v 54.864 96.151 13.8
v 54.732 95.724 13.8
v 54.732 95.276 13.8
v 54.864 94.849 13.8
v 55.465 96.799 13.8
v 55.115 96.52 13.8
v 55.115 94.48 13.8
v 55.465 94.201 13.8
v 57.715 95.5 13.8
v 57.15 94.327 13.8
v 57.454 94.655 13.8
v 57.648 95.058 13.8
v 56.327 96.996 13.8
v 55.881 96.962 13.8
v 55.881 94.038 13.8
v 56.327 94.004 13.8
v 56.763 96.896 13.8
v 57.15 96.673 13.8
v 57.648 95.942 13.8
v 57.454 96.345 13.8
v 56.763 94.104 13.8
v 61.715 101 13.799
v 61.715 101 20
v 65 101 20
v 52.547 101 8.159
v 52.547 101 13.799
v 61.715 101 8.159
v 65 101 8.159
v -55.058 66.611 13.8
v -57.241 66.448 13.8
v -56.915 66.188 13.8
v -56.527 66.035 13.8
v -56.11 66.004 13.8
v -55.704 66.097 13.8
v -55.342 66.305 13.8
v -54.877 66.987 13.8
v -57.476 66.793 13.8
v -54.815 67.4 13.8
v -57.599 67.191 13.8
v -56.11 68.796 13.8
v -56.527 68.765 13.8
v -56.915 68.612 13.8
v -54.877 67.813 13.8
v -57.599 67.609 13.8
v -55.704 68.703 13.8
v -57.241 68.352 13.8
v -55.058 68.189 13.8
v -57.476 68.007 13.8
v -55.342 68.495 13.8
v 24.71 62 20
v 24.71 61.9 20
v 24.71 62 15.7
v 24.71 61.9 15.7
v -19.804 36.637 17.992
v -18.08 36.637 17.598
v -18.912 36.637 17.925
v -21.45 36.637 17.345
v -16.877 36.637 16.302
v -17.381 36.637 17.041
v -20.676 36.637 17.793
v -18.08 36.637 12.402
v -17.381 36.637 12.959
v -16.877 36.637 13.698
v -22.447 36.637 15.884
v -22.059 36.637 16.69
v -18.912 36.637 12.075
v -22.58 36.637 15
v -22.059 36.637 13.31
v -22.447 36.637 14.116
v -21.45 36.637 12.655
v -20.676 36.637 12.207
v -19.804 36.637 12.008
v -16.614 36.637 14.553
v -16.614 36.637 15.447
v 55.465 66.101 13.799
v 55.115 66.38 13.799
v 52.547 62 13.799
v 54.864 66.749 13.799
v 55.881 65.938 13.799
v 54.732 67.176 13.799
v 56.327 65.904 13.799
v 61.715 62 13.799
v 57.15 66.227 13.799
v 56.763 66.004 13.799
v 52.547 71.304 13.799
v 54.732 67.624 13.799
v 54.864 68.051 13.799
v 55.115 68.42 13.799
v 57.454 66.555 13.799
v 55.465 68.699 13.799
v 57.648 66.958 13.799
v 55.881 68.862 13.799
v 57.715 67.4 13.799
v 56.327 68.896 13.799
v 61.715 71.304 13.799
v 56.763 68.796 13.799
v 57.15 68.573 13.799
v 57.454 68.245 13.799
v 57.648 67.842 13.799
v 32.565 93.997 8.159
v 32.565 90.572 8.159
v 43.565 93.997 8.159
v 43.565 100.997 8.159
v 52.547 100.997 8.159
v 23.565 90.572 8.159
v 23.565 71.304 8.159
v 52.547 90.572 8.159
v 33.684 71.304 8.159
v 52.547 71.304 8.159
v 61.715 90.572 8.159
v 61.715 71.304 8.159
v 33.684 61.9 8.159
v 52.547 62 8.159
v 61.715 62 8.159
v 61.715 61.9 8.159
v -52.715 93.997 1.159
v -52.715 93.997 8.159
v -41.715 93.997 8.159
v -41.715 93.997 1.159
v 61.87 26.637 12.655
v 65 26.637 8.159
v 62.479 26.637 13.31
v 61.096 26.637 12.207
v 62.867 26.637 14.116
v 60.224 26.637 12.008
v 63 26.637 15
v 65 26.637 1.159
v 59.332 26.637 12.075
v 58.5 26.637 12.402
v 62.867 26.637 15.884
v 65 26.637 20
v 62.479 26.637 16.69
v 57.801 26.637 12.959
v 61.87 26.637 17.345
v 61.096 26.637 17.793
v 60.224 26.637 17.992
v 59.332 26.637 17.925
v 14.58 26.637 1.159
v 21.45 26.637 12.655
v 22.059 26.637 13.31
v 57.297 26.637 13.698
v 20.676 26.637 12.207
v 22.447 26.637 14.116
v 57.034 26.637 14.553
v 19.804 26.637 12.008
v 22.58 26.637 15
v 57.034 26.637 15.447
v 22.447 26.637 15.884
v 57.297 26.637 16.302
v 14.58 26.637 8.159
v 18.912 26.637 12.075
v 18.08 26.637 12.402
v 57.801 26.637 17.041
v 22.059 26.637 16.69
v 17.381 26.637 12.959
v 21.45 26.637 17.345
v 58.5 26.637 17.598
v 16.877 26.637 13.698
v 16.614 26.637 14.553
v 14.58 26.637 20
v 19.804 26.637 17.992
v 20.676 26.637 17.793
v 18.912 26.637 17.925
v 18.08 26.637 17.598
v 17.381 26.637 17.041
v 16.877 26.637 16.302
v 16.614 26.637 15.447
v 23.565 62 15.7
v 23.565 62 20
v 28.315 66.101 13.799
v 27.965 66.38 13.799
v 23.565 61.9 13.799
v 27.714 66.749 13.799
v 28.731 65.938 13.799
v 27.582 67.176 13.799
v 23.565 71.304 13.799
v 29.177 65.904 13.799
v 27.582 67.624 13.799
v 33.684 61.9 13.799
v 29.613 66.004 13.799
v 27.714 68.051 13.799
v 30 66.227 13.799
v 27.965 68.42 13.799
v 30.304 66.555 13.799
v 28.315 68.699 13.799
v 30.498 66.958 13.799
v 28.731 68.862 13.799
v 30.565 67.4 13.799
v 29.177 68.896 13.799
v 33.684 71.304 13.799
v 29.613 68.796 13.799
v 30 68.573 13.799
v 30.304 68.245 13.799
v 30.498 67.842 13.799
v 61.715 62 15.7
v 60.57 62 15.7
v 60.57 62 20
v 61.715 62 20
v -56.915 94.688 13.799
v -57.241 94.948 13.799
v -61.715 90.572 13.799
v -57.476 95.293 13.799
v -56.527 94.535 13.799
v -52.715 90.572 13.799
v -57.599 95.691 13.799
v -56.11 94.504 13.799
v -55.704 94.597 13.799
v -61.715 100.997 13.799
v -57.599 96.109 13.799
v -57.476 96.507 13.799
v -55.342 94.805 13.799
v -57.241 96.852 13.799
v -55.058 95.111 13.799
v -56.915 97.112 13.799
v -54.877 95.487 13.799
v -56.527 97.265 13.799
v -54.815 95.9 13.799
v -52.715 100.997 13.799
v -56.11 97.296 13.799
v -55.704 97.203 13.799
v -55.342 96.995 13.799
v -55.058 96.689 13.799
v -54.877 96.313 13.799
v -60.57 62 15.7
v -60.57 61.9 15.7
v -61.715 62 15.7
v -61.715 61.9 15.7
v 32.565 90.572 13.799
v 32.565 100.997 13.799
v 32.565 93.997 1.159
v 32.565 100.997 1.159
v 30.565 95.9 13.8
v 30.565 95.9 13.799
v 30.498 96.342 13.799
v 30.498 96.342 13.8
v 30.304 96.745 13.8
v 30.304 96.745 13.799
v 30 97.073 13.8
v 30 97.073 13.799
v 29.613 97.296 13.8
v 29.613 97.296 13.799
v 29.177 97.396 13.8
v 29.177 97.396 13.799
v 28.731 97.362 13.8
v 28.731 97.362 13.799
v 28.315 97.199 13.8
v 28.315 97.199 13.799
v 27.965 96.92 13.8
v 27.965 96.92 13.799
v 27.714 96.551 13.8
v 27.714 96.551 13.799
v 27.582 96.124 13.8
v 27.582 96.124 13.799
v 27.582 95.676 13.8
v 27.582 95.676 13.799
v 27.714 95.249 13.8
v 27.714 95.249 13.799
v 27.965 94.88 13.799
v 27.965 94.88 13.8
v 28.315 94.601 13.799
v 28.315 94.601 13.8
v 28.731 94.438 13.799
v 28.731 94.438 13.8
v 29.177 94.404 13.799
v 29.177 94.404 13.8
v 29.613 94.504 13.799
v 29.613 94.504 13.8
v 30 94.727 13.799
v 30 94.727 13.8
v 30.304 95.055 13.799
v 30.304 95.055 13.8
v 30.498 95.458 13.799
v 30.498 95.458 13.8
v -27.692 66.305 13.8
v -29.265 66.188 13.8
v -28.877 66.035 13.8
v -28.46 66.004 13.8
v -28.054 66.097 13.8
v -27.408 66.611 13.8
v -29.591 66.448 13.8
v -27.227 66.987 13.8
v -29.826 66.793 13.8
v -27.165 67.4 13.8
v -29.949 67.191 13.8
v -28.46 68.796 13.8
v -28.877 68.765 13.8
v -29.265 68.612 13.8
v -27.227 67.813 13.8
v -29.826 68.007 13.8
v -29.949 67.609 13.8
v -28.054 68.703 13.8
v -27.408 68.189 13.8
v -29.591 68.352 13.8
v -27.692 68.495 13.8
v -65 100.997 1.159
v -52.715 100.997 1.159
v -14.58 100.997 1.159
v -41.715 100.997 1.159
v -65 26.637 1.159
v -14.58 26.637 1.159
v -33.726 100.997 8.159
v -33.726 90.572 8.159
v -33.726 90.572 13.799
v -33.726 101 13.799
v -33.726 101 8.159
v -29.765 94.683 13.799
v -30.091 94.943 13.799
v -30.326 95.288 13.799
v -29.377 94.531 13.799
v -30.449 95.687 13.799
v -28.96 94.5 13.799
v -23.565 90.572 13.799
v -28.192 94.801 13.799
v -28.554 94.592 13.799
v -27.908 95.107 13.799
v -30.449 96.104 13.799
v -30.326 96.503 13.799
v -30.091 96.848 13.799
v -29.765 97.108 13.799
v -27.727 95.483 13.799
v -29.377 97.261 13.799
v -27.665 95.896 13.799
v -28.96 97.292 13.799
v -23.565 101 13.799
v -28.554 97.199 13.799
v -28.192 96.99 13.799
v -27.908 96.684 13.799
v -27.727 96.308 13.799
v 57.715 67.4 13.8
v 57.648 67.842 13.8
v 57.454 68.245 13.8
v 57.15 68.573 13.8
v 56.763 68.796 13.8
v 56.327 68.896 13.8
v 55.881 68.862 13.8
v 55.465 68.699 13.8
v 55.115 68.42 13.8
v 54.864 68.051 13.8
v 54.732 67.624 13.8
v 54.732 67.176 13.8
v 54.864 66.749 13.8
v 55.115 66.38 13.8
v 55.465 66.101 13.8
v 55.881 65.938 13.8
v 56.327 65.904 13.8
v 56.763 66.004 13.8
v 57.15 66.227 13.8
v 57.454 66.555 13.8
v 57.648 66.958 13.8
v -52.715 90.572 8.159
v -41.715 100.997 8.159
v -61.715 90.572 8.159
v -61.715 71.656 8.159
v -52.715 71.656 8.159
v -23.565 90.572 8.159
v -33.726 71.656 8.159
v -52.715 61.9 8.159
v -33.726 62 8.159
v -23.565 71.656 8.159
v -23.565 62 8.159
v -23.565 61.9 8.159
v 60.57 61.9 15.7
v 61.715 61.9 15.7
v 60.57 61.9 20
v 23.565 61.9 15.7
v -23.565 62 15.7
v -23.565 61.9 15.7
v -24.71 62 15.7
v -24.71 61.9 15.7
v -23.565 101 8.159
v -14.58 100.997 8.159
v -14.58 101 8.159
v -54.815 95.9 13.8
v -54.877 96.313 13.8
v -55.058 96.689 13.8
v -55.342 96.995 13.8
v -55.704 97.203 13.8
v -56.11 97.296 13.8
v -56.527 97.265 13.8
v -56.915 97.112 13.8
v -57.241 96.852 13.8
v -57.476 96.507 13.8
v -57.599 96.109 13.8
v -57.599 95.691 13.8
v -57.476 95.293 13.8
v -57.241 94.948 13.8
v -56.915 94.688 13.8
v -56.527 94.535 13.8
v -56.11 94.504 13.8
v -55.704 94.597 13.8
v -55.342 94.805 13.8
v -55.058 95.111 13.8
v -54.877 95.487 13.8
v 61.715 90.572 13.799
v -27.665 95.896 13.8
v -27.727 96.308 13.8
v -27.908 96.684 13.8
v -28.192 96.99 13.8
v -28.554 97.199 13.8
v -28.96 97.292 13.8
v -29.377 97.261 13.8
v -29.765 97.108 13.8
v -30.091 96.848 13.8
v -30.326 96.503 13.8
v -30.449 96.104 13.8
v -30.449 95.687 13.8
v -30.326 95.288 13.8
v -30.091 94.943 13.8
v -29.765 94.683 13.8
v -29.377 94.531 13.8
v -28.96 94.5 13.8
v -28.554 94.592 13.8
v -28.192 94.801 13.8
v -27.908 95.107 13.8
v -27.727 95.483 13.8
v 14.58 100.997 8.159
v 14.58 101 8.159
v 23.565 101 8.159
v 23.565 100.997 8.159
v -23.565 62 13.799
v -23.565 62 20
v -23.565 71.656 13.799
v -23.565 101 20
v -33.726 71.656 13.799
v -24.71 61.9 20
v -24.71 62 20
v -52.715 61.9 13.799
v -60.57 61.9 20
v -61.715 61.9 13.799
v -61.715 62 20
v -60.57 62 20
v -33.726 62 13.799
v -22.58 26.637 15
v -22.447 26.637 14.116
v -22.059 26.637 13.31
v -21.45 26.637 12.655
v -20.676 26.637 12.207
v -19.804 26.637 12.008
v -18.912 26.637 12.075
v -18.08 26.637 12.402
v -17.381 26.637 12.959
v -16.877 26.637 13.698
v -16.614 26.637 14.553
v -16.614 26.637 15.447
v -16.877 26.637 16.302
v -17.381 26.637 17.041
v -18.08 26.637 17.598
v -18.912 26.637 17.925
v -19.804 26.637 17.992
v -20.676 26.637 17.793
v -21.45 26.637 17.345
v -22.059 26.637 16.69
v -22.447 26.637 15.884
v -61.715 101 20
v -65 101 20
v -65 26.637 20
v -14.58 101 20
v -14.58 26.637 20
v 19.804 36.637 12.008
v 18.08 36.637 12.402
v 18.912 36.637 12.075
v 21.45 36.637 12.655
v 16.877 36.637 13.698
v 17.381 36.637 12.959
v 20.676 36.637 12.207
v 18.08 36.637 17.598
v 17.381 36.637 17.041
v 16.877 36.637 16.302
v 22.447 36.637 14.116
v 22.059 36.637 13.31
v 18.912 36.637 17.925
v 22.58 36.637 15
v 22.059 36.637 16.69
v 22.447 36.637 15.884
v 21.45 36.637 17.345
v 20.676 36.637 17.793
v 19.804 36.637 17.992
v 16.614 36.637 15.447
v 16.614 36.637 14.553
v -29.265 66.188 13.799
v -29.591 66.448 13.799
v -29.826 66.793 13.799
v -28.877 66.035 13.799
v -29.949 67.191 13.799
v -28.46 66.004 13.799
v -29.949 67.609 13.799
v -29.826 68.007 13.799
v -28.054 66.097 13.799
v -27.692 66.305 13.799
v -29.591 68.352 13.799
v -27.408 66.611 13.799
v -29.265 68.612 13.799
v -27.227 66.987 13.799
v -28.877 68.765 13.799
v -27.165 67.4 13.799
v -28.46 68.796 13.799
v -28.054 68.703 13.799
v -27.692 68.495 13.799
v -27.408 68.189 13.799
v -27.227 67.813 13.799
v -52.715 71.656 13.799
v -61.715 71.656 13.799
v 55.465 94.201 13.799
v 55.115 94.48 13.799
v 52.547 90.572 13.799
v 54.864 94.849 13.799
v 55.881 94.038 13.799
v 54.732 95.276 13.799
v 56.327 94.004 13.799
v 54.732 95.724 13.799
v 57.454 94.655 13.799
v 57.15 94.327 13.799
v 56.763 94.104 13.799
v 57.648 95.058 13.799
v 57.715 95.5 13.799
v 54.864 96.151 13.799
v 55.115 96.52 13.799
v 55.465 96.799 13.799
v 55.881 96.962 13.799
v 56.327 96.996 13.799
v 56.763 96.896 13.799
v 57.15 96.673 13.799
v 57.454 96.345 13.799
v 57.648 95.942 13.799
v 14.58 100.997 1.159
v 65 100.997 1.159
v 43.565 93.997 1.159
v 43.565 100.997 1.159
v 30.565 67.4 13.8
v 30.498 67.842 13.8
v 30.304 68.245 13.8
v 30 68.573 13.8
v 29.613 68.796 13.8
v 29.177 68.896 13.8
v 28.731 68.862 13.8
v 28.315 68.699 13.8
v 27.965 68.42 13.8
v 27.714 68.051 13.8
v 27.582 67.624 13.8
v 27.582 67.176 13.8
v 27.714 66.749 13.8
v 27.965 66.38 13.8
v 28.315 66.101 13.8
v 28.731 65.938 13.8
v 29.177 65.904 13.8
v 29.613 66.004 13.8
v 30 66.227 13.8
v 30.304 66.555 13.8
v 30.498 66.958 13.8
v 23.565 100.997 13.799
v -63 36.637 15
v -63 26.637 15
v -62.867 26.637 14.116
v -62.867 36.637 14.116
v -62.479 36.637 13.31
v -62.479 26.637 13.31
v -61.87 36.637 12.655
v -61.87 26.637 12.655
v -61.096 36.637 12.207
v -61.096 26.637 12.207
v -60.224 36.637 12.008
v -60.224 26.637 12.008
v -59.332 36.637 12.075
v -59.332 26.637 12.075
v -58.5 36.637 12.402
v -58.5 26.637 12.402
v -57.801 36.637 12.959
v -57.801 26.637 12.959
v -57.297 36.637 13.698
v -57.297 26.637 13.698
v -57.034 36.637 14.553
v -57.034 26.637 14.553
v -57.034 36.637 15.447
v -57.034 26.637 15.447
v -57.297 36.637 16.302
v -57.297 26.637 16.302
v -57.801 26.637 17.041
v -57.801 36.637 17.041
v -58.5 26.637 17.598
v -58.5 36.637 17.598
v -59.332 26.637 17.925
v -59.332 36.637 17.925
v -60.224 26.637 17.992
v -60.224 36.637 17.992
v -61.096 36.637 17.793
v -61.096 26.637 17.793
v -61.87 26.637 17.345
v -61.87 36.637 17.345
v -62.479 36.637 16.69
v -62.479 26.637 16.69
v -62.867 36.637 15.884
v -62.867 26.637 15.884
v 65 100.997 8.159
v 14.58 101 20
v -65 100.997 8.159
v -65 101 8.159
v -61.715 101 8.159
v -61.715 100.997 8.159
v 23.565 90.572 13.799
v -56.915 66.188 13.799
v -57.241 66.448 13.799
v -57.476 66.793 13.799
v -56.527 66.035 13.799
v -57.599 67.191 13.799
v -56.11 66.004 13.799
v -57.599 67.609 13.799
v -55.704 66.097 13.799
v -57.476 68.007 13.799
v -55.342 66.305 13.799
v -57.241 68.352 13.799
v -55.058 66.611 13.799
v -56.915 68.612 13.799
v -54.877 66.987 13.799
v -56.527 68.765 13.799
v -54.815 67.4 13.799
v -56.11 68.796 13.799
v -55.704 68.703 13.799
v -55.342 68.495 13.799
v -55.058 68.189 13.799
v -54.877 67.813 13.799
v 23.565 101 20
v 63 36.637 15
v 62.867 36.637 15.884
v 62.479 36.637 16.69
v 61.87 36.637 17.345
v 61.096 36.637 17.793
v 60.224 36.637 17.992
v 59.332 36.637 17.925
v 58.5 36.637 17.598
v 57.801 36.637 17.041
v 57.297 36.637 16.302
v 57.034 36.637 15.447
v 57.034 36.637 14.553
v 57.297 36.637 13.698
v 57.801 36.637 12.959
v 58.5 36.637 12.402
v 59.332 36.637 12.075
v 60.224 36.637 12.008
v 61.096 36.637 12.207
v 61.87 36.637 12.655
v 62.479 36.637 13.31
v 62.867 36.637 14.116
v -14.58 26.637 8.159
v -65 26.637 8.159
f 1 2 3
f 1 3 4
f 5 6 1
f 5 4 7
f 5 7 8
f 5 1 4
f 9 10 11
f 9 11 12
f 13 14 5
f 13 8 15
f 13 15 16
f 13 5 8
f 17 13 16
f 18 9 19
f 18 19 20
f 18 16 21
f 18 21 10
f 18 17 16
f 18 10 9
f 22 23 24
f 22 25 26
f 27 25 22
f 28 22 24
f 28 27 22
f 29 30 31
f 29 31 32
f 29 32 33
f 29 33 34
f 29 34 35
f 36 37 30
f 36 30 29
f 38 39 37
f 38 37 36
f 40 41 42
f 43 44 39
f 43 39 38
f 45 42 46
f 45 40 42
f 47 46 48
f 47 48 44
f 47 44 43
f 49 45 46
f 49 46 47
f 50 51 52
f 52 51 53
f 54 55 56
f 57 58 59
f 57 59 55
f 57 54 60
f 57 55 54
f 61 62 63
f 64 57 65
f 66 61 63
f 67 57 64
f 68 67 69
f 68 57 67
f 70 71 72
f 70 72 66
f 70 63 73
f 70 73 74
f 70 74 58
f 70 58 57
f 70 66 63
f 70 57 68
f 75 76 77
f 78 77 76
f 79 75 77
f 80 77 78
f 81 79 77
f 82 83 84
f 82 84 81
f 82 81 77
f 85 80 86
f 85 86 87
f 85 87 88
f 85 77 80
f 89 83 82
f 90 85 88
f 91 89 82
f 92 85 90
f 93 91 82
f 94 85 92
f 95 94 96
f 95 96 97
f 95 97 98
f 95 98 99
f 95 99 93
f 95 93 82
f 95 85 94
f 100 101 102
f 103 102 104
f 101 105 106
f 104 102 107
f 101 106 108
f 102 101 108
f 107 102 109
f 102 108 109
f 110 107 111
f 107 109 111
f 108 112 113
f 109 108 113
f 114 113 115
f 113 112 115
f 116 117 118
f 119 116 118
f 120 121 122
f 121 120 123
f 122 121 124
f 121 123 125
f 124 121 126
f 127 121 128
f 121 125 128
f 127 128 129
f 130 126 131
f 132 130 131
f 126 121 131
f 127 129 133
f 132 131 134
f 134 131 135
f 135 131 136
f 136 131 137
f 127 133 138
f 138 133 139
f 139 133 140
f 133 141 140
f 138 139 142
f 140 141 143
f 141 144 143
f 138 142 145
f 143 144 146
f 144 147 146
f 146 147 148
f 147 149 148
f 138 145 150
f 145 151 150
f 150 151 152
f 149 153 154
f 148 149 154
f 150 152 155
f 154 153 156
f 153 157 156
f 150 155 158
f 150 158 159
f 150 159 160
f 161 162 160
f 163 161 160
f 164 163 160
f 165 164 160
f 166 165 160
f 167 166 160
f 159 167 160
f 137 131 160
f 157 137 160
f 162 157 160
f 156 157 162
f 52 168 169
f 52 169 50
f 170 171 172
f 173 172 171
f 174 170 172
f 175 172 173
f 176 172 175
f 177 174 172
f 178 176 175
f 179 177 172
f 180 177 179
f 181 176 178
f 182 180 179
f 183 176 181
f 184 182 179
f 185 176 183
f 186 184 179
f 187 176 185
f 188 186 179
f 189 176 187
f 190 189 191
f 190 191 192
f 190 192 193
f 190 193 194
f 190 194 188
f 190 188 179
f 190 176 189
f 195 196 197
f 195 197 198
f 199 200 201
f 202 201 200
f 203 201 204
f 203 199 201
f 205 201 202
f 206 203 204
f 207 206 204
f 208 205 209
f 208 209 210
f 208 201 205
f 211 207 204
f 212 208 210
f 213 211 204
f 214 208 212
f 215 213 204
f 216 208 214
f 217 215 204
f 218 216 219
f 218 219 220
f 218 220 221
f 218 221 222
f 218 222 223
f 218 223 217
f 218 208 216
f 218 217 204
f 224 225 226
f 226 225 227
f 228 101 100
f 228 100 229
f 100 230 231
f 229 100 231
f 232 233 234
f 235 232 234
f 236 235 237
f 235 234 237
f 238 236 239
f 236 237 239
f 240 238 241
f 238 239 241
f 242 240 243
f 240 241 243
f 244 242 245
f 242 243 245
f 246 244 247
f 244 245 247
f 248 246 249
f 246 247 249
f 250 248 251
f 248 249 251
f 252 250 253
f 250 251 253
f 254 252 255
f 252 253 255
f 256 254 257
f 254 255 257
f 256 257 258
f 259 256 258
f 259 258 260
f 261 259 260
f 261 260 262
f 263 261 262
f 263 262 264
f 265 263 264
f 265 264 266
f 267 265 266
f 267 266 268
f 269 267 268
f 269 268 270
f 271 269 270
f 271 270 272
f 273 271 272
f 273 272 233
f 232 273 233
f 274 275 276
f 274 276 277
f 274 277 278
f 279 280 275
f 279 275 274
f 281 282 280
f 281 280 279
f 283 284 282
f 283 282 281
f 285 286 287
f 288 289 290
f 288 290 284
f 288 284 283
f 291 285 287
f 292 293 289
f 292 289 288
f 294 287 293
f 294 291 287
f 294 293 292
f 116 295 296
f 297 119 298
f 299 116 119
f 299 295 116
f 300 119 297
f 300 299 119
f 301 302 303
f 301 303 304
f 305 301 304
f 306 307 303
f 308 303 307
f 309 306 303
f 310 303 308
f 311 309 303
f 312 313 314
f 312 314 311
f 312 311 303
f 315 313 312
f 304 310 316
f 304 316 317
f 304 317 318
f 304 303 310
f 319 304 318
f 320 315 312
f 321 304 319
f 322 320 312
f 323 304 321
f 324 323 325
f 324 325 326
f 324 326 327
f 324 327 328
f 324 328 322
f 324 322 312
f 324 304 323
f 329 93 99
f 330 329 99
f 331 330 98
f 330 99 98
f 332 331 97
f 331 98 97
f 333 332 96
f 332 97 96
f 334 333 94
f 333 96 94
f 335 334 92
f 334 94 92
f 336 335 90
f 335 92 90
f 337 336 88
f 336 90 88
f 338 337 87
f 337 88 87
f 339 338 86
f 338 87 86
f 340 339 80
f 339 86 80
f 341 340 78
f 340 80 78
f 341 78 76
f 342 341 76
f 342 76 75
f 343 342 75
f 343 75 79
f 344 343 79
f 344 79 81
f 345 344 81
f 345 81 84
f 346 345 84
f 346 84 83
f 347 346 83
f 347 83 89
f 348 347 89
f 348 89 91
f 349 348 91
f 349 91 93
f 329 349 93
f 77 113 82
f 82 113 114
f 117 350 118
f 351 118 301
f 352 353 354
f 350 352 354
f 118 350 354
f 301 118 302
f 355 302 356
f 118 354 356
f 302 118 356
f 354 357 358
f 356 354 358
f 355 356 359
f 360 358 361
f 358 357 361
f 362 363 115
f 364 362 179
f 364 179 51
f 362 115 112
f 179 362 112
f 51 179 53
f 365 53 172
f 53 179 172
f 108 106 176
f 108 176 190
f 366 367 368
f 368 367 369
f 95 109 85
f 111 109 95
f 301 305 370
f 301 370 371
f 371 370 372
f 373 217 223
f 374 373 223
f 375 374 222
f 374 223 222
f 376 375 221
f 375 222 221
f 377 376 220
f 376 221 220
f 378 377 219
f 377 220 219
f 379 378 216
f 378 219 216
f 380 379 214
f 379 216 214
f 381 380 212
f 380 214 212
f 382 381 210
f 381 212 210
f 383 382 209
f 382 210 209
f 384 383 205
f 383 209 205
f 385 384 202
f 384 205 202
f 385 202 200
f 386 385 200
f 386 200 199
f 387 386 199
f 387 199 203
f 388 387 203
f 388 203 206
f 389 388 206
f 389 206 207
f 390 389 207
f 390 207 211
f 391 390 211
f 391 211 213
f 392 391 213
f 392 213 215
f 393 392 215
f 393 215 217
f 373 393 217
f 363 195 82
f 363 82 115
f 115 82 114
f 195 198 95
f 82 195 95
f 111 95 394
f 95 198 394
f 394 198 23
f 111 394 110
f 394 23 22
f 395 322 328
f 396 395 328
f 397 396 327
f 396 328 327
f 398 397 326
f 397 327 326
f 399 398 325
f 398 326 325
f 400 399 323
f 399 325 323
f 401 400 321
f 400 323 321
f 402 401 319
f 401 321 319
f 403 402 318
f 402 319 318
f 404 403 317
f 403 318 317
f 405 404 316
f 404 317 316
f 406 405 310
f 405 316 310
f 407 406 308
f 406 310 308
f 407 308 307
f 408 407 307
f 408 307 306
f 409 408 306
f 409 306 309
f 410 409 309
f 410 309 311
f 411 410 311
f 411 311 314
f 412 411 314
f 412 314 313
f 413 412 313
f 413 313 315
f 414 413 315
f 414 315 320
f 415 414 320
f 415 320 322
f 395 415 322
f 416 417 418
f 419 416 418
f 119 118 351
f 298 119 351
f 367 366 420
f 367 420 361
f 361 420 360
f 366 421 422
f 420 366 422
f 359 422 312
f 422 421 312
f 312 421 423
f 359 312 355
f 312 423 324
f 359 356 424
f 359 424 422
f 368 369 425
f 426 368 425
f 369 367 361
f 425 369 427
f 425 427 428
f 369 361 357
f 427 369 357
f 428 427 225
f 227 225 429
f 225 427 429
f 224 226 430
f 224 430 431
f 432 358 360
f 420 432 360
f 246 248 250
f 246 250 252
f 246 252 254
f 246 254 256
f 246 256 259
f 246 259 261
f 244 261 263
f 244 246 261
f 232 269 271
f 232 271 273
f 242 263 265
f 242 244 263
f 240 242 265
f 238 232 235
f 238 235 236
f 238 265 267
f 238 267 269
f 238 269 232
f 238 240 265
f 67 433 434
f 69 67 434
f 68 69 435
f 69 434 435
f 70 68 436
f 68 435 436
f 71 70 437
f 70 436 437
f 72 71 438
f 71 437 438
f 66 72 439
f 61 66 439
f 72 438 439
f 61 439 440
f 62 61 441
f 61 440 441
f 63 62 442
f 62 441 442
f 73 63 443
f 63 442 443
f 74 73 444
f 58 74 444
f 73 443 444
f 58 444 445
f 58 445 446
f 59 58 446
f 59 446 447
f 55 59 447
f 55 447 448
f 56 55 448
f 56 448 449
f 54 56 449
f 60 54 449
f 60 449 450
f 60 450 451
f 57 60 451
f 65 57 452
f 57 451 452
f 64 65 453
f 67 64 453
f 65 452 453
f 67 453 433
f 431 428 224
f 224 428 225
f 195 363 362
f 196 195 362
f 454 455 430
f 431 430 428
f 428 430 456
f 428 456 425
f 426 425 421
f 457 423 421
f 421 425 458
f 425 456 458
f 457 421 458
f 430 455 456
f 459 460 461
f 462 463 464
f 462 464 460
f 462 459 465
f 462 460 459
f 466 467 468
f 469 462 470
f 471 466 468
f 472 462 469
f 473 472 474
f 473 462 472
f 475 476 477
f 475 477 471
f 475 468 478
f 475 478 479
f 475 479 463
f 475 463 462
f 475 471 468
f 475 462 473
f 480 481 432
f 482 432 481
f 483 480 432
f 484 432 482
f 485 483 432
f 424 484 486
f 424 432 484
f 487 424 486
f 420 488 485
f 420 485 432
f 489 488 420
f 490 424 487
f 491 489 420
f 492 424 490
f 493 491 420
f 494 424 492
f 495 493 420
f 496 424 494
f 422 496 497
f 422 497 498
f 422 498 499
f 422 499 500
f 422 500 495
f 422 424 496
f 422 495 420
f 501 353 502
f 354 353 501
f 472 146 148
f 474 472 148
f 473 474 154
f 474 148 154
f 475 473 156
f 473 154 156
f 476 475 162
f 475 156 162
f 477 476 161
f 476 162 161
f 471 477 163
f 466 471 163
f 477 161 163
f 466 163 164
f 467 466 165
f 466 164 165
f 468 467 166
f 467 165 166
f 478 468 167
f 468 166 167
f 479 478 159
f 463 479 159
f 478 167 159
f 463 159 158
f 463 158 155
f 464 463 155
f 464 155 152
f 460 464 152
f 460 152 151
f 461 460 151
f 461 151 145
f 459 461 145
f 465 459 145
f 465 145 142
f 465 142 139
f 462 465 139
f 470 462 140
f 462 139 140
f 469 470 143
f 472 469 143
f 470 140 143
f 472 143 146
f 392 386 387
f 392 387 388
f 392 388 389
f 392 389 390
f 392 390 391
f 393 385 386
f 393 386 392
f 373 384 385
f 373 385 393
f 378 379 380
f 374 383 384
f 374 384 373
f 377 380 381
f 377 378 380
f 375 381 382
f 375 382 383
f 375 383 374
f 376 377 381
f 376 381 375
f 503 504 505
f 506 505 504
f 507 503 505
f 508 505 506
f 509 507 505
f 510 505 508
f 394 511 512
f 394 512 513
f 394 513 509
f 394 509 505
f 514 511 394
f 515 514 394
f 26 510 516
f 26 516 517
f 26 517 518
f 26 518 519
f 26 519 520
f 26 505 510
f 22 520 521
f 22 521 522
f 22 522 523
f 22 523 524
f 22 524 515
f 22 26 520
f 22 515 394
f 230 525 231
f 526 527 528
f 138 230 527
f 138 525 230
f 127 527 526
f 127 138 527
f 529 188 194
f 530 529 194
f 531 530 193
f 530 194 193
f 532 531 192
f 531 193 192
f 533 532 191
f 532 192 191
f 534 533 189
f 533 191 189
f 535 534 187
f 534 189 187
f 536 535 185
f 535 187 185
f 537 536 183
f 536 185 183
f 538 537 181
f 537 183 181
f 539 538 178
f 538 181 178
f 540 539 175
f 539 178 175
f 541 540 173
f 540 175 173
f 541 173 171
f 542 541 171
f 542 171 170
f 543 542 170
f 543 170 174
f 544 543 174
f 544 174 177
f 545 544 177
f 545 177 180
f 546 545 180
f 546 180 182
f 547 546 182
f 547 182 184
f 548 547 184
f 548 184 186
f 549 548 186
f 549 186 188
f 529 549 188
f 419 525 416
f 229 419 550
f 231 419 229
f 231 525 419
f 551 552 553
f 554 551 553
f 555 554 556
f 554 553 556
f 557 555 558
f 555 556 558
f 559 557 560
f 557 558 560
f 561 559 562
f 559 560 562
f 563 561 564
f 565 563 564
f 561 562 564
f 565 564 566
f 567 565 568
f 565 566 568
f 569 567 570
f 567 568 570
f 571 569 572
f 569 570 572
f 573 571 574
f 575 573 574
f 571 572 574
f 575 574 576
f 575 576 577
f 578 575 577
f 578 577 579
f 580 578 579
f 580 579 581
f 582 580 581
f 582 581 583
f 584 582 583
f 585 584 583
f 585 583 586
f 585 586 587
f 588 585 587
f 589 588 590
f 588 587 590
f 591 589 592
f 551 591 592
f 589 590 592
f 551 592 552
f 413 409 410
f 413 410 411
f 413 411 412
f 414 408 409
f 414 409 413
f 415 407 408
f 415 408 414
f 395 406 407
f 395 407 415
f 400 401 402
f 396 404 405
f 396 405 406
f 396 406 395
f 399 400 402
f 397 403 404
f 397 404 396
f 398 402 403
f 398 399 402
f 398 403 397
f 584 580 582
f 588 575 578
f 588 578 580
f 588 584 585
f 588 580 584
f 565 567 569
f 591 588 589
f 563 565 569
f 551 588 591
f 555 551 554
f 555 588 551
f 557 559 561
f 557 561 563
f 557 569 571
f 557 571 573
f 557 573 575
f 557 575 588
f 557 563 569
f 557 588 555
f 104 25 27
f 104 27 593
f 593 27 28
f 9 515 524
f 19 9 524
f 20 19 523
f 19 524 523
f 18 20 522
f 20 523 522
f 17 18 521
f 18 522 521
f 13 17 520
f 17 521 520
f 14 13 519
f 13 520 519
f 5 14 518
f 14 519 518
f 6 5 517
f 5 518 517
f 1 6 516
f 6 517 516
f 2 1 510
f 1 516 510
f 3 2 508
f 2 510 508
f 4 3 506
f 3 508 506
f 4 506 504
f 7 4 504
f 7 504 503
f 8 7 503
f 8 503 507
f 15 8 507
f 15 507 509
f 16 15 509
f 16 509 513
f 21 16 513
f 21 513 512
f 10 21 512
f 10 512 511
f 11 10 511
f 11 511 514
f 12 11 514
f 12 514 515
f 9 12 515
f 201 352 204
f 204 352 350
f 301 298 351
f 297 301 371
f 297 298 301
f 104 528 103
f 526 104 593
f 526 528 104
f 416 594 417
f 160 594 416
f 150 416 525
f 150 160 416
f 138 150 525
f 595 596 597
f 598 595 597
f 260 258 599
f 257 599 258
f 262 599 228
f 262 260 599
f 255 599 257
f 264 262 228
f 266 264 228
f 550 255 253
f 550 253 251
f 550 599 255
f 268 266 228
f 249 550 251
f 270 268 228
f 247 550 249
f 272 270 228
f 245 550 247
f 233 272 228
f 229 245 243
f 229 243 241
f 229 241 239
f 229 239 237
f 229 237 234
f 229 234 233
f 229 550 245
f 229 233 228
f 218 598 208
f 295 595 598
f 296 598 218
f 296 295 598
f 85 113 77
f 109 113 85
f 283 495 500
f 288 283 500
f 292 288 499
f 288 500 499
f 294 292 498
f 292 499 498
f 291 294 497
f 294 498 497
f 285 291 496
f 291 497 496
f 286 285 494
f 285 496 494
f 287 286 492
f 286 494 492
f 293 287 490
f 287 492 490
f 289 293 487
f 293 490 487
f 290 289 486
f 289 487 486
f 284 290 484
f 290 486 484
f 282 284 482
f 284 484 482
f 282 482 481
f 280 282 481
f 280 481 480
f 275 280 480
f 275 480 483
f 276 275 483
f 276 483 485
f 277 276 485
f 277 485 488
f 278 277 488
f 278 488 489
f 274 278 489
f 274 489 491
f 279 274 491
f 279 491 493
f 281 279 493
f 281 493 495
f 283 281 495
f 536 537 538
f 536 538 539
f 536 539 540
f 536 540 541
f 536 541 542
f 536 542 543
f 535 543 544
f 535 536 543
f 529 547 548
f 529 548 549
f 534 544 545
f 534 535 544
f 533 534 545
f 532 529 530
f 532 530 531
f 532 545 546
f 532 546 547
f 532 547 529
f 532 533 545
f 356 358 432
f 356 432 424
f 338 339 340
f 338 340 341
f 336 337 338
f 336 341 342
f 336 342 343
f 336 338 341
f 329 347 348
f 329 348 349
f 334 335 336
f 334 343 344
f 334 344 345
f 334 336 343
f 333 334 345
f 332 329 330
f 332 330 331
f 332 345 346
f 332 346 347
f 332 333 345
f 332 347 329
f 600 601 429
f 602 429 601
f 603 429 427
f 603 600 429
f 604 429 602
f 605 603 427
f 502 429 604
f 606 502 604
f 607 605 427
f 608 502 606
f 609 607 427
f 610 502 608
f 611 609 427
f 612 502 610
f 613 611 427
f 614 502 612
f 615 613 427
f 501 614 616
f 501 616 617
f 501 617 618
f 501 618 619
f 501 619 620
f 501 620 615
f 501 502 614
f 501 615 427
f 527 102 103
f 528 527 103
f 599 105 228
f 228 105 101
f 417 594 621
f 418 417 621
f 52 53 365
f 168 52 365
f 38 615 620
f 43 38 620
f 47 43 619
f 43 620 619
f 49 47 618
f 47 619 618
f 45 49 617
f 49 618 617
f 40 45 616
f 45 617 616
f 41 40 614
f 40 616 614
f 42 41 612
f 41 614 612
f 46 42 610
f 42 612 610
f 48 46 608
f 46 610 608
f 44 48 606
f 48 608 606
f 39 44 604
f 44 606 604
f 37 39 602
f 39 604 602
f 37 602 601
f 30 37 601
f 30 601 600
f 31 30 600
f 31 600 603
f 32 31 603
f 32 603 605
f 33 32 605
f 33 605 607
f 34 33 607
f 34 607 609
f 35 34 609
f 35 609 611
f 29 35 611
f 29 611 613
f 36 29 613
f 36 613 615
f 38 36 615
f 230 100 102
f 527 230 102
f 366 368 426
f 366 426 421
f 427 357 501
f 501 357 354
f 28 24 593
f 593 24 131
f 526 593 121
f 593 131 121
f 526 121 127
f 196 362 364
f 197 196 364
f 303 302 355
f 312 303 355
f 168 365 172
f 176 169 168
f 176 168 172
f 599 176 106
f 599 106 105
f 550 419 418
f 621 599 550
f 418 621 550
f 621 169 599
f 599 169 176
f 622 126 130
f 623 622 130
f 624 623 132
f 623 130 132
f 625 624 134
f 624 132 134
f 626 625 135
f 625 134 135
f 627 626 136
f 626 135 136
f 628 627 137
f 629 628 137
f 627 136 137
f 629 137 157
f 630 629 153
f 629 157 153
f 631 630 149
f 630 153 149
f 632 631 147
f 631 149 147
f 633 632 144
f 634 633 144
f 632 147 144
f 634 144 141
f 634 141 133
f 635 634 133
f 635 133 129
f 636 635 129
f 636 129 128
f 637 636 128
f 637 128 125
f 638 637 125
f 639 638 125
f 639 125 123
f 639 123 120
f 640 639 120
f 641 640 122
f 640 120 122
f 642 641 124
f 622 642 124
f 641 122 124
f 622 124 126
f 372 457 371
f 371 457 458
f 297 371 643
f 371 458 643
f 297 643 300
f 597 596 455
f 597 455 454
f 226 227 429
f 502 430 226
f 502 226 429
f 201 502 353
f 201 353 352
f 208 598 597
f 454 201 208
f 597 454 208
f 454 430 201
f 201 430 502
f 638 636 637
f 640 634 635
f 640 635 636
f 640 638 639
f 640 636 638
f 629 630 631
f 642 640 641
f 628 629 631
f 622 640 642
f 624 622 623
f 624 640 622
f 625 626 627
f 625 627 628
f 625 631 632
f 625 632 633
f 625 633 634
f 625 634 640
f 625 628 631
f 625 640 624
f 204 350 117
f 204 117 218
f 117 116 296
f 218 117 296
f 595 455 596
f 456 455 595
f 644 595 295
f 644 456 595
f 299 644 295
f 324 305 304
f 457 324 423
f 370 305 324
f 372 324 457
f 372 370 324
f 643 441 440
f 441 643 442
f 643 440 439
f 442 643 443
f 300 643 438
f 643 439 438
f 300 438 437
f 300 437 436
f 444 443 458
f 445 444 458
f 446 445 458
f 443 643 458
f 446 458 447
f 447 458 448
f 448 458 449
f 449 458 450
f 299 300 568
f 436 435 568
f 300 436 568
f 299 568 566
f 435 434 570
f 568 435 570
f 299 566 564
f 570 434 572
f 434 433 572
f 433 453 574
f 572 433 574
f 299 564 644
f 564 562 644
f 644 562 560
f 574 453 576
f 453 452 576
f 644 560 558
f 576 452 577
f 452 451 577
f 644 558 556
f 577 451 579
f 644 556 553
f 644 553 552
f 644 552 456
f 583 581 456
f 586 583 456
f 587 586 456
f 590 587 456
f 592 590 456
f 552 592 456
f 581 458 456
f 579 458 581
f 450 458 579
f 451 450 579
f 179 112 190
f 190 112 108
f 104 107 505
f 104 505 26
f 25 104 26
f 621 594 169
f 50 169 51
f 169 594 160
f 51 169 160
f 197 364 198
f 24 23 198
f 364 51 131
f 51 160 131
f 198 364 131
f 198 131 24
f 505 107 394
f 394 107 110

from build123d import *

# Parameters (mm, degrees)
SKETCH2_W            = 130
SKETCH2_H            = 40
BOSS_EXTRUDE1_DEPTH  = 75
SKETCH6_W            = 29.16
SKETCH6_H            = 49.32
BOSS_EXTRUDE2_DEPTH  = 16.07
SKETCH7_W            = 15.96
SKETCH7_H            = 42.65
CUT_EXTRUDE1_DEPTH   = 8.48
SKETCH8_W            = 7
SKETCH8_H            = 42.65
CUT_EXTRUDE2_DEPTH   = 1.145
SKETCH9_W            = 7
SKETCH9_H            = 42.65
CUT_EXTRUDE3_DEPTH   = 1.145
SKETCH11_W           = 35.86
SKETCH11_H           = 21.1
CUT_EXTRUDE4_DEPTH   = 8.2
SKETCH13_W           = 3.9
SKETCH13_H           = 21.1
CUT_EXTRUDE5_DEPTH   = 1.145
SKETCH14_W           = 3.9
SKETCH14_H           = 21.1
CUT_EXTRUDE6_DEPTH   = 1.145
SKETCH15_W           = 35.86
SKETCH15_H           = 21.1
CUT_EXTRUDE7_DEPTH   = 8.2
SKETCH16_W           = 3.9
SKETCH16_H           = 21.1
CUT_EXTRUDE8_DEPTH   = 1.145
SKETCH17_W           = 3.9
SKETCH17_H           = 21.1
CUT_EXTRUDE9_DEPTH   = 1.145
SKETCH20_W           = 29.16
SKETCH20_H           = 16.07
BOSS_EXTRUDE3_DEPTH  = 25.68
SKETCH21_W           = 40
SKETCH21_H           = 25
CUT_EXTRUDE10_DEPTH  = 40
SKETCH22_W           = 50
SKETCH22_H           = 25
CUT_EXTRUDE11_DEPTH  = 40
BOSS_EXTRUDE4_DEPTH  = 8
BOSS_EXTRUDE5_DEPTH  = 8
SKETCH25_W           = 130
SKETCH25_H           = 26.637321837
CUT_EXTRUDE12_DEPTH  = 57.07
SKETCH26_W           = 130
SKETCH26_H           = 25
BOSS_EXTRUDE6_DEPTH  = 40
SKETCH27_W           = 29.16
SKETCH27_H           = 48.362678163
CUT_EXTRUDE13_DEPTH  = 57.07
BOSS_EXTRUDE9_DEPTH  = 26
BOSS_EXTRUDE10_DEPTH = 26
SKETCH32_W           = 38.15
SKETCH32_H           = 39.1
SKETCH32_R           = 2.5
CUT_EXTRUDE14_DEPTH  = 24
SKETCH33_R           = 1.4
BOSS_EXTRUDE11_DEPTH = 2
SKETCH34_W           = 1.145
SKETCH34_H           = 4.3
CUT_EXTRUDE15_DEPTH  = 39
SKETCH35_W           = 38.15
SKETCH35_H           = 39.1
SKETCH35_R           = 2.5
CUT_EXTRUDE16_DEPTH  = 24
SKETCH36_W           = 1.145
SKETCH36_H           = 4.3
CUT_EXTRUDE17_DEPTH  = 39
SKETCH37_R           = 1.5
BOSS_EXTRUDE12_DEPTH = 2
SKETCH41_W           = 11
SKETCH41_H           = 5.5
CUT_EXTRUDE18_DEPTH  = 8.8
SKETCH42_W           = 11
SKETCH42_H           = 5.5
CUT_EXTRUDE19_DEPTH  = 8.8
SKETCH43_R           = 3
CUT_EXTRUDE20_DEPTH  = 10
SKETCH44_R           = 3
CUT_EXTRUDE21_DEPTH  = 10
SKETCH45_W           = 50.42
SKETCH45_H           = 28.159053891
CUT_EXTRUDE22_DEPTH  = 90
SKETCH46_W           = 50.42
SKETCH46_H           = 28.159053891
CUT_EXTRUDE23_DEPTH  = 90
SKETCH47_W           = 50.42
SKETCH47_H           = 7
BOSS_EXTRUDE13_DEPTH = 7
SKETCH48_W           = 50.42
SKETCH48_H           = 7
BOSS_EXTRUDE14_DEPTH = 67.36
SKETCH49_W           = 11
SKETCH49_H           = 7
CUT_EXTRUDE24_DEPTH  = 8
SKETCH50_W           = 9
SKETCH50_H           = 10.425354422
SKETCH50_H_2         = 9.756007641
SKETCH50_W_2         = 10.161312311
SKETCH50_H_3         = 9.656007641
SKETCH50_H_4         = 10.428032585
BOSS_EXTRUDE15_DEPTH = 5.64
SKETCH51_W           = 9
SKETCH51_H           = 10.425354422
SKETCH51_W_2         = 9.167731693
SKETCH51_H_2         = 10.428032585
SKETCH51_W_3         = 10.119146351
SKETCH51_H_3         = 9.404026774
SKETCH51_H_4         = 9.304026774
BOSS_EXTRUDE16_DEPTH = 5.64


with BuildPart() as part:
    # Sketch2 → Boss-Extrude1 (new body)
    with BuildSketch(Plane(origin=(0, 0, 0), x_dir=(1, 0, 0), z_dir=(0, 1, 0))):
        Rectangle(SKETCH2_W, SKETCH2_H)
    extrude(amount=BOSS_EXTRUDE1_DEPTH)

    # Sketch6 → Boss-Extrude2 (add)
    with BuildSketch(Plane.XY.offset(20)):
        with Locations((0, 50.34)):
            Rectangle(SKETCH6_W, SKETCH6_H)
    extrude(amount=BOSS_EXTRUDE2_DEPTH)

    # Sketch7 → Cut-Extrude1 (cut)
    with BuildSketch(Plane.XY.offset(36.07)):
        with Locations((0, 53.675)):
            Rectangle(SKETCH7_W, SKETCH7_H)
    extrude(amount=-CUT_EXTRUDE1_DEPTH, mode=Mode.SUBTRACT)

    # Sketch8 → Cut-Extrude2 (cut)
    with BuildSketch(Plane(origin=(-7.98, 0, 0), x_dir=(0, 0, -1), z_dir=(1, 0, 0))):
        with Locations((-31.09, 53.675)):
            Rectangle(SKETCH8_W, SKETCH8_H)
    extrude(amount=-CUT_EXTRUDE2_DEPTH, mode=Mode.SUBTRACT)

    # Sketch9 → Cut-Extrude3 (cut)
    with BuildSketch(Plane.ZY.offset(-7.98)):
        with Locations((31.09, 53.675)):
            Rectangle(SKETCH9_W, SKETCH9_H)
    extrude(amount=-CUT_EXTRUDE3_DEPTH, mode=Mode.SUBTRACT)

    # Sketch11 → Cut-Extrude4 (cut)
    with BuildSketch(Plane.XY.offset(20)):
        with Locations((42.64, 64.45)):
            Rectangle(SKETCH11_W, SKETCH11_H)
    extrude(amount=-CUT_EXTRUDE4_DEPTH, mode=Mode.SUBTRACT)

    # Sketch13 → Cut-Extrude5 (cut)
    with BuildSketch(Plane(origin=(24.71, 0, 0), x_dir=(0, 0, -1), z_dir=(1, 0, 0))):
        with Locations((-13.75, 64.45)):
            Rectangle(SKETCH13_W, SKETCH13_H)
    extrude(amount=-CUT_EXTRUDE5_DEPTH, mode=Mode.SUBTRACT)

    # Sketch14 → Cut-Extrude6 (cut)
    with BuildSketch(Plane.ZY.offset(-60.57)):
        with Locations((13.75, 64.45)):
            Rectangle(SKETCH14_W, SKETCH14_H)
    extrude(amount=-CUT_EXTRUDE6_DEPTH, mode=Mode.SUBTRACT)

    # Sketch15 → Cut-Extrude7 (cut)
    with BuildSketch(Plane.XY.offset(20)):
        with Locations((-42.64, 64.45)):
            Rectangle(SKETCH15_W, SKETCH15_H)
    extrude(amount=-CUT_EXTRUDE7_DEPTH, mode=Mode.SUBTRACT)

    # Sketch16 → Cut-Extrude8 (cut)
    with BuildSketch(Plane(origin=(-60.57, 0, 0), x_dir=(0, 0, -1), z_dir=(1, 0, 0))):
        with Locations((-13.75, 64.45)):
            Rectangle(SKETCH16_W, SKETCH16_H)
    extrude(amount=-CUT_EXTRUDE8_DEPTH, mode=Mode.SUBTRACT)

    # Sketch17 → Cut-Extrude9 (cut)
    with BuildSketch(Plane.ZY.offset(24.71)):
        with Locations((13.75, 64.45)):
            Rectangle(SKETCH17_W, SKETCH17_H)
    extrude(amount=-CUT_EXTRUDE9_DEPTH, mode=Mode.SUBTRACT)

    # Sketch20 → Boss-Extrude3 (add)
    with BuildSketch(Plane(origin=(0, 25.68, 0), x_dir=(-1, 0, 0), z_dir=(0, -1, 0))):
        with Locations((0, -28.035)):
            Rectangle(SKETCH20_W, SKETCH20_H)
    extrude(amount=BOSS_EXTRUDE3_DEPTH)

    # Sketch21 → Cut-Extrude10 (cut)
    with BuildSketch(Plane(origin=(0, 75, 0), x_dir=(1, 0, 0), z_dir=(0, 1, 0))):
        with Locations((45, 7.5)):
            Rectangle(SKETCH21_W, SKETCH21_H)
        with Locations((-45, 7.5)):
            Rectangle(SKETCH21_W, SKETCH21_H)
    extrude(amount=-CUT_EXTRUDE10_DEPTH, mode=Mode.SUBTRACT)

    # Sketch22 → Cut-Extrude11 (cut)
    with BuildSketch(Plane(origin=(0, 75, 0), x_dir=(1, 0, 0), z_dir=(0, 1, 0))):
        with Locations((0, 7.5)):
            Rectangle(SKETCH22_W, SKETCH22_H)
    extrude(amount=-CUT_EXTRUDE11_DEPTH, mode=Mode.SUBTRACT)

    # Sketch23 → Boss-Extrude4 (add)
    with BuildSketch(Plane(origin=(0, 53.9, 0), x_dir=(1, 0, 0), z_dir=(0, 1, 0))):
        Polygon((-60.57, -20), (-60.57, -15.7), (-61.715, -15.7), (-61.715, -11.8), (-23.565, -11.8), (-23.565, -15.7), (-24.71, -15.7), (-24.71, -20), align=None)
    extrude(amount=BOSS_EXTRUDE4_DEPTH)

    # Sketch24 → Boss-Extrude5 (add)
    with BuildSketch(Plane(origin=(0, 53.9, 0), x_dir=(1, 0, 0), z_dir=(0, 1, 0))):
        Polygon((24.71, -20), (24.71, -15.7), (23.565, -15.7), (23.565, -11.8), (61.715, -11.8), (61.715, -15.7), (60.57, -15.7), (60.57, -20), align=None)
    extrude(amount=BOSS_EXTRUDE5_DEPTH)

    # Sketch25 → Cut-Extrude12 (cut, through all)
    with BuildSketch(Plane.XY.offset(36.07)):
        with Locations((0, 13.318660919)):
            Rectangle(SKETCH25_W, SKETCH25_H)
    extrude(amount=-CUT_EXTRUDE12_DEPTH, mode=Mode.SUBTRACT)

    # Sketch26 → Boss-Extrude6 (add)
    with BuildSketch(Plane(origin=(0, 35, 0), x_dir=(1, 0, 0), z_dir=(0, 1, 0))):
        with Locations((0, 7.5)):
            Rectangle(SKETCH26_W, SKETCH26_H)
    extrude(amount=BOSS_EXTRUDE6_DEPTH)

    # Sketch27 → Cut-Extrude13 (cut, through all)
    with BuildSketch(Plane.XY.offset(36.07)):
        with Locations((0, 50.818660919)):
            Rectangle(SKETCH27_W, SKETCH27_H)
    extrude(amount=-CUT_EXTRUDE13_DEPTH, mode=Mode.SUBTRACT)

    # Sketch30 → Boss-Extrude9 (add)
    with BuildSketch(Plane(origin=(0, 75, 0), x_dir=(1, 0, 0), z_dir=(0, 1, 0))):
        Polygon((-65, 20), (-65, -20), (-60.57, -20), (-60.57, -15.7), (-61.715, -15.7), (-61.715, -11.8), (-23.565, -11.8), (-23.565, -15.7), (-24.71, -15.7), (-24.71, -20), (-14.58, -20), (-14.58, 20), align=None)
    extrude(amount=BOSS_EXTRUDE9_DEPTH)

    # Sketch31 → Boss-Extrude10 (add)
    with BuildSketch(Plane(origin=(0, 75, 0), x_dir=(1, 0, 0), z_dir=(0, 1, 0))):
        Polygon((14.58, 20), (14.58, -20), (24.71, -20), (24.71, -15.7), (23.565, -15.7), (23.565, -11.8), (61.715, -11.8), (61.715, -15.7), (60.57, -15.7), (60.57, -20), (65, -20), (65, 20), align=None)
    extrude(amount=BOSS_EXTRUDE10_DEPTH)

    # Sketch32 → Cut-Extrude14 (cut)
    with BuildSketch(Plane.XY.offset(11.8)):
        with Locations((-42.64, 81.45)):
            Rectangle(SKETCH32_W, SKETCH32_H)
        with Locations((-56.215, 95.9)):
            Circle(SKETCH32_R, mode=Mode.SUBTRACT)
        with Locations((-56.215, 67.4)):
            Circle(SKETCH32_R, mode=Mode.SUBTRACT)
        with Locations((-29.065, 95.895613698)):
            Circle(SKETCH32_R, mode=Mode.SUBTRACT)
        with Locations((-28.565, 67.4)):
            Circle(SKETCH32_R, mode=Mode.SUBTRACT)
    extrude(amount=-CUT_EXTRUDE14_DEPTH, mode=Mode.SUBTRACT)

    # Sketch33 → Boss-Extrude11 (add)
    with BuildSketch(Plane.XY.offset(11.8)):
        with Locations((-56.215, 95.9)):
            Circle(SKETCH33_R)
        with Locations((-56.215, 67.4)):
            Circle(SKETCH33_R)
        with Locations((-29.065, 95.895613698)):
            Circle(SKETCH33_R)
        with Locations((-28.565, 67.4)):
            Circle(SKETCH33_R)
    extrude(amount=BOSS_EXTRUDE11_DEPTH)

    # Sketch34 → Cut-Extrude15 (cut)
    with BuildSketch(Plane(origin=(0, 101, 0), x_dir=(1, 0, 0), z_dir=(0, 1, 0))):
        with Locations((-61.1425, -17.85)):
            Rectangle(SKETCH34_W, SKETCH34_H)
        with Locations((-24.1375, -17.85)):
            Rectangle(SKETCH34_W, SKETCH34_H)
    extrude(amount=-CUT_EXTRUDE15_DEPTH, mode=Mode.SUBTRACT)

    # Sketch35 → Cut-Extrude16 (cut)
    with BuildSketch(Plane.XY.offset(11.8)):
        with Locations((42.64, 81.45)):
            Rectangle(SKETCH35_W, SKETCH35_H)
        with Locations((29.065, 67.4)):
            Circle(SKETCH35_R, mode=Mode.SUBTRACT)
        with Locations((29.065, 95.9)):
            Circle(SKETCH35_R, mode=Mode.SUBTRACT)
        with Locations((56.215, 67.4)):
            Circle(SKETCH35_R, mode=Mode.SUBTRACT)
        with Locations((56.215, 95.5)):
            Circle(SKETCH35_R, mode=Mode.SUBTRACT)
    extrude(amount=-CUT_EXTRUDE16_DEPTH, mode=Mode.SUBTRACT)

    # Sketch36 → Cut-Extrude17 (cut)
    with BuildSketch(Plane(origin=(0, 101, 0), x_dir=(1, 0, 0), z_dir=(0, 1, 0))):
        with Locations((24.1375, -17.85)):
            Rectangle(SKETCH36_W, SKETCH36_H)
        with Locations((61.1425, -17.85)):
            Rectangle(SKETCH36_W, SKETCH36_H)
    extrude(amount=-CUT_EXTRUDE17_DEPTH, mode=Mode.SUBTRACT)

    # Sketch37 → Boss-Extrude12 (add)
    with BuildSketch(Plane.XY.offset(11.8)):
        with Locations((29.065, 95.9)):
            Circle(SKETCH37_R)
        with Locations((29.065, 67.4)):
            Circle(SKETCH37_R)
        with Locations((56.215, 95.5)):
            Circle(SKETCH37_R)
        with Locations((56.215, 67.4)):
            Circle(SKETCH37_R)
    extrude(amount=BOSS_EXTRUDE12_DEPTH)

    # Sketch41 → Cut-Extrude18 (cut, through all)
    with BuildSketch(Plane.XY.offset(-12.2)):
        with Locations((-46.215, 98.25)):
            Rectangle(SKETCH41_W, SKETCH41_H)
    extrude(amount=-CUT_EXTRUDE18_DEPTH, mode=Mode.SUBTRACT)

    # Sketch42 → Cut-Extrude19 (cut, through all)
    with BuildSketch(Plane.XY.offset(-12.2)):
        with Locations((39.065, 98.25)):
            Rectangle(SKETCH42_W, SKETCH42_H)
    extrude(amount=-CUT_EXTRUDE19_DEPTH, mode=Mode.SUBTRACT)

    # Sketch43 → Cut-Extrude20 (cut)
    with BuildSketch(Plane(origin=(0, 26.637321837, 0), x_dir=(-1, 0, 0), z_dir=(0, -1, 0))):
        with Locations((60, -15)):
            Circle(SKETCH43_R)
        with Locations((60, 15)):
            Circle(SKETCH43_R)
        with Locations((19.58, -15)):
            Circle(SKETCH43_R)
        with Locations((19.58, 15)):
            Circle(SKETCH43_R)
    extrude(amount=-CUT_EXTRUDE20_DEPTH, mode=Mode.SUBTRACT)

    # Sketch44 → Cut-Extrude21 (cut)
    with BuildSketch(Plane.XZ.offset(-26.637321837)):
        with Locations((19.58, 15)):
            Circle(SKETCH44_R)
        with Locations((19.58, -15)):
            Circle(SKETCH44_R)
        with Locations((60, 15)):
            Circle(SKETCH44_R)
        with Locations((60, -15)):
            Circle(SKETCH44_R)
    extrude(amount=-CUT_EXTRUDE21_DEPTH, mode=Mode.SUBTRACT)

    # Sketch45 → Cut-Extrude22 (cut)
    with BuildSketch(Plane(origin=(0, 101, 0), x_dir=(1, 0, 0), z_dir=(0, 1, 0))):
        with Locations((39.79, 5.920473054)):
            Rectangle(SKETCH45_W, SKETCH45_H)
    extrude(amount=-CUT_EXTRUDE22_DEPTH, mode=Mode.SUBTRACT)

    # Sketch46 → Cut-Extrude23 (cut)
    with BuildSketch(Plane(origin=(0, 101, 0), x_dir=(1, 0, 0), z_dir=(0, 1, 0))):
        with Locations((-39.79, 5.920473054)):
            Rectangle(SKETCH46_W, SKETCH46_H)
    extrude(amount=-CUT_EXTRUDE23_DEPTH, mode=Mode.SUBTRACT)

    # Sketch47 → Boss-Extrude13 (add)
    with BuildSketch(Plane(origin=(0, 0, 8.159053891), x_dir=(-1, 0, 0), z_dir=(0, 0, -1))):
        with Locations((-39.79, 30.137321837)):
            Rectangle(SKETCH47_W, SKETCH47_H)
        with Locations((39.79, 30.137321837)):
            Rectangle(SKETCH47_W, SKETCH47_H)
    extrude(amount=BOSS_EXTRUDE13_DEPTH)

    # Sketch48 → Boss-Extrude14 (add)
    with BuildSketch(Plane(origin=(0, 33.637321837, 0), x_dir=(1, 0, 0), z_dir=(0, 1, 0))):
        with Locations((39.79, -4.659053891)):
            Rectangle(SKETCH48_W, SKETCH48_H)
        with Locations((-39.79, -4.659053891)):
            Rectangle(SKETCH48_W, SKETCH48_H)
    extrude(amount=BOSS_EXTRUDE14_DEPTH)

    # Sketch49 → Cut-Extrude24 (cut, through all)
    with BuildSketch(Plane.XY.offset(8.159053891)):
        with Locations((-47.215, 97.497321837)):
            Rectangle(SKETCH49_W, SKETCH49_H)
        with Locations((38.065, 97.497321837)):
            Rectangle(SKETCH49_W, SKETCH49_H)
    extrude(amount=-CUT_EXTRUDE24_DEPTH, mode=Mode.SUBTRACT)

    # Sketch50 → Boss-Extrude15 (add)
    with BuildSketch(Plane.XY.offset(8.159053891)):
        with Locations((-57.215, 95.784644626)):
            Rectangle(SKETCH50_W, SKETCH50_H)
        with Locations((-57.215, 66.778003821)):
            Rectangle(SKETCH50_W, SKETCH50_H_2)
        with Locations((-28.645656155, 66.828003821)):
            Rectangle(SKETCH50_W_2, SKETCH50_H_3)
        with Locations((-28.645656155, 95.785983708)):
            Rectangle(SKETCH50_W_2, SKETCH50_H_4)
    extrude(amount=BOSS_EXTRUDE15_DEPTH)

    # Sketch51 → Boss-Extrude16 (add)
    with BuildSketch(Plane.XY.offset(8.159053891)):
        with Locations((28.065, 95.784644626)):
            Rectangle(SKETCH51_W, SKETCH51_H)
        with Locations((57.131134153, 95.785983708)):
            Rectangle(SKETCH51_W_2, SKETCH51_H_2)
        with Locations((28.624573176, 66.602013387)):
            Rectangle(SKETCH51_W_3, SKETCH51_H_3)
        with Locations((57.131134153, 66.652013387)):
            Rectangle(SKETCH51_W_2, SKETCH51_H_4)
    extrude(amount=BOSS_EXTRUDE16_DEPTH)


solid = part.part
